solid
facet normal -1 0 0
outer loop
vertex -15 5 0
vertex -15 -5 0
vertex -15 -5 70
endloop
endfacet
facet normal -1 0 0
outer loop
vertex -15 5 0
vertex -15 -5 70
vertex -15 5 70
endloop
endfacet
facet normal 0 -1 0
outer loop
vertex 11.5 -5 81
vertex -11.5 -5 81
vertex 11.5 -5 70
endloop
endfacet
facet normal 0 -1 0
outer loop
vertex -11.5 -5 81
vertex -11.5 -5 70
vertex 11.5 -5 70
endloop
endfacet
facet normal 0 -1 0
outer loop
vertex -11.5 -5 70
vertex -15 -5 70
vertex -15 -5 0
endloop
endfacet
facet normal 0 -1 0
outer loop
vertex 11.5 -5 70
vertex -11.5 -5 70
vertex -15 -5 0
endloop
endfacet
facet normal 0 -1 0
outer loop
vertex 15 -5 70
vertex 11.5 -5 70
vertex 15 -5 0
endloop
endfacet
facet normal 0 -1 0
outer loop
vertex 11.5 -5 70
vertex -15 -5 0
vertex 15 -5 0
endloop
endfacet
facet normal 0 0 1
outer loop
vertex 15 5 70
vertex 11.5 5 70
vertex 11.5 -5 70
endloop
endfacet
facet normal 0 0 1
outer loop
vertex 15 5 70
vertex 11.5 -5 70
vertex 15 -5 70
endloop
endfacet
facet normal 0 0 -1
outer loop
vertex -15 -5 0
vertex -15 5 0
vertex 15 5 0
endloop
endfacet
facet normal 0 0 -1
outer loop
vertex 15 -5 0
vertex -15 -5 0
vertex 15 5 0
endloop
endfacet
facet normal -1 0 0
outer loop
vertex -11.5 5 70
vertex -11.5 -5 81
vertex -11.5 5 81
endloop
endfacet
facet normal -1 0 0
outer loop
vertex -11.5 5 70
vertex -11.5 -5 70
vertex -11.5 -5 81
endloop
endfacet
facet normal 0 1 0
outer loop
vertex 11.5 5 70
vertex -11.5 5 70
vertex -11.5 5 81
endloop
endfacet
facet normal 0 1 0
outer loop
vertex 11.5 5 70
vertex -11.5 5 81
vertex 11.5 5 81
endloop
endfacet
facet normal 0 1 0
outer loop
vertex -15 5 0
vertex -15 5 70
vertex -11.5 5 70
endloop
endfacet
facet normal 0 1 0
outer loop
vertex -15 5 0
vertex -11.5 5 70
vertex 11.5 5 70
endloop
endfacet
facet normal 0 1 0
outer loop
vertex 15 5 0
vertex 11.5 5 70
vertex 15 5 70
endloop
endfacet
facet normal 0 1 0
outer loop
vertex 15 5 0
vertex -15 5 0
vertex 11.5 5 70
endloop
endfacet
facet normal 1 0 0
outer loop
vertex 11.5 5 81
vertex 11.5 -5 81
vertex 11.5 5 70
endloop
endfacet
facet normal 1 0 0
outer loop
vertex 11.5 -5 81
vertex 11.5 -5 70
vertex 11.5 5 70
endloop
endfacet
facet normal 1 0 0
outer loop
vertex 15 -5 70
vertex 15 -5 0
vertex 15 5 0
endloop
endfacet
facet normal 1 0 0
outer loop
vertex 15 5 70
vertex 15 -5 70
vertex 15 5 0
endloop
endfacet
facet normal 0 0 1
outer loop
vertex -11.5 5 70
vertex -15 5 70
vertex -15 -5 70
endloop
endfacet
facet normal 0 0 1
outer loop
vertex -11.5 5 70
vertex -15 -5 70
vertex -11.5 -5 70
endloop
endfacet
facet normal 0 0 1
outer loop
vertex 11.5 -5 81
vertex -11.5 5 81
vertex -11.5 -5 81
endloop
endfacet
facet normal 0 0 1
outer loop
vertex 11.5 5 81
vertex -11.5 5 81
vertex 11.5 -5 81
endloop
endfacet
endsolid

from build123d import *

# Parameters (mm, degrees)
F0_W     = 30
F0_H     = 10
F1_DEPTH = 70
F2_W     = 23
F2_H     = 10
F3_DEPTH = 8
F4_W     = 23
F4_H     = 10
F5_DEPTH = 3


with BuildPart() as f1:
    # F0 (on Top) → F1 (new body)
    with BuildSketch(Plane.XY):
        Rectangle(F0_W, F0_H)
    extrude(amount=F1_DEPTH)

    # F2 (on face) → F3 (join)
    with BuildSketch(Plane.XY.offset(70)):
        Rectangle(F2_W, F2_H)
    extrude(amount=F3_DEPTH)

    # F4 (on face) → F5 (join)
    with BuildSketch(Plane.XY.offset(78)):
        Rectangle(F4_W, F4_H)
    extrude(amount=F5_DEPTH)


solid = f1.part
